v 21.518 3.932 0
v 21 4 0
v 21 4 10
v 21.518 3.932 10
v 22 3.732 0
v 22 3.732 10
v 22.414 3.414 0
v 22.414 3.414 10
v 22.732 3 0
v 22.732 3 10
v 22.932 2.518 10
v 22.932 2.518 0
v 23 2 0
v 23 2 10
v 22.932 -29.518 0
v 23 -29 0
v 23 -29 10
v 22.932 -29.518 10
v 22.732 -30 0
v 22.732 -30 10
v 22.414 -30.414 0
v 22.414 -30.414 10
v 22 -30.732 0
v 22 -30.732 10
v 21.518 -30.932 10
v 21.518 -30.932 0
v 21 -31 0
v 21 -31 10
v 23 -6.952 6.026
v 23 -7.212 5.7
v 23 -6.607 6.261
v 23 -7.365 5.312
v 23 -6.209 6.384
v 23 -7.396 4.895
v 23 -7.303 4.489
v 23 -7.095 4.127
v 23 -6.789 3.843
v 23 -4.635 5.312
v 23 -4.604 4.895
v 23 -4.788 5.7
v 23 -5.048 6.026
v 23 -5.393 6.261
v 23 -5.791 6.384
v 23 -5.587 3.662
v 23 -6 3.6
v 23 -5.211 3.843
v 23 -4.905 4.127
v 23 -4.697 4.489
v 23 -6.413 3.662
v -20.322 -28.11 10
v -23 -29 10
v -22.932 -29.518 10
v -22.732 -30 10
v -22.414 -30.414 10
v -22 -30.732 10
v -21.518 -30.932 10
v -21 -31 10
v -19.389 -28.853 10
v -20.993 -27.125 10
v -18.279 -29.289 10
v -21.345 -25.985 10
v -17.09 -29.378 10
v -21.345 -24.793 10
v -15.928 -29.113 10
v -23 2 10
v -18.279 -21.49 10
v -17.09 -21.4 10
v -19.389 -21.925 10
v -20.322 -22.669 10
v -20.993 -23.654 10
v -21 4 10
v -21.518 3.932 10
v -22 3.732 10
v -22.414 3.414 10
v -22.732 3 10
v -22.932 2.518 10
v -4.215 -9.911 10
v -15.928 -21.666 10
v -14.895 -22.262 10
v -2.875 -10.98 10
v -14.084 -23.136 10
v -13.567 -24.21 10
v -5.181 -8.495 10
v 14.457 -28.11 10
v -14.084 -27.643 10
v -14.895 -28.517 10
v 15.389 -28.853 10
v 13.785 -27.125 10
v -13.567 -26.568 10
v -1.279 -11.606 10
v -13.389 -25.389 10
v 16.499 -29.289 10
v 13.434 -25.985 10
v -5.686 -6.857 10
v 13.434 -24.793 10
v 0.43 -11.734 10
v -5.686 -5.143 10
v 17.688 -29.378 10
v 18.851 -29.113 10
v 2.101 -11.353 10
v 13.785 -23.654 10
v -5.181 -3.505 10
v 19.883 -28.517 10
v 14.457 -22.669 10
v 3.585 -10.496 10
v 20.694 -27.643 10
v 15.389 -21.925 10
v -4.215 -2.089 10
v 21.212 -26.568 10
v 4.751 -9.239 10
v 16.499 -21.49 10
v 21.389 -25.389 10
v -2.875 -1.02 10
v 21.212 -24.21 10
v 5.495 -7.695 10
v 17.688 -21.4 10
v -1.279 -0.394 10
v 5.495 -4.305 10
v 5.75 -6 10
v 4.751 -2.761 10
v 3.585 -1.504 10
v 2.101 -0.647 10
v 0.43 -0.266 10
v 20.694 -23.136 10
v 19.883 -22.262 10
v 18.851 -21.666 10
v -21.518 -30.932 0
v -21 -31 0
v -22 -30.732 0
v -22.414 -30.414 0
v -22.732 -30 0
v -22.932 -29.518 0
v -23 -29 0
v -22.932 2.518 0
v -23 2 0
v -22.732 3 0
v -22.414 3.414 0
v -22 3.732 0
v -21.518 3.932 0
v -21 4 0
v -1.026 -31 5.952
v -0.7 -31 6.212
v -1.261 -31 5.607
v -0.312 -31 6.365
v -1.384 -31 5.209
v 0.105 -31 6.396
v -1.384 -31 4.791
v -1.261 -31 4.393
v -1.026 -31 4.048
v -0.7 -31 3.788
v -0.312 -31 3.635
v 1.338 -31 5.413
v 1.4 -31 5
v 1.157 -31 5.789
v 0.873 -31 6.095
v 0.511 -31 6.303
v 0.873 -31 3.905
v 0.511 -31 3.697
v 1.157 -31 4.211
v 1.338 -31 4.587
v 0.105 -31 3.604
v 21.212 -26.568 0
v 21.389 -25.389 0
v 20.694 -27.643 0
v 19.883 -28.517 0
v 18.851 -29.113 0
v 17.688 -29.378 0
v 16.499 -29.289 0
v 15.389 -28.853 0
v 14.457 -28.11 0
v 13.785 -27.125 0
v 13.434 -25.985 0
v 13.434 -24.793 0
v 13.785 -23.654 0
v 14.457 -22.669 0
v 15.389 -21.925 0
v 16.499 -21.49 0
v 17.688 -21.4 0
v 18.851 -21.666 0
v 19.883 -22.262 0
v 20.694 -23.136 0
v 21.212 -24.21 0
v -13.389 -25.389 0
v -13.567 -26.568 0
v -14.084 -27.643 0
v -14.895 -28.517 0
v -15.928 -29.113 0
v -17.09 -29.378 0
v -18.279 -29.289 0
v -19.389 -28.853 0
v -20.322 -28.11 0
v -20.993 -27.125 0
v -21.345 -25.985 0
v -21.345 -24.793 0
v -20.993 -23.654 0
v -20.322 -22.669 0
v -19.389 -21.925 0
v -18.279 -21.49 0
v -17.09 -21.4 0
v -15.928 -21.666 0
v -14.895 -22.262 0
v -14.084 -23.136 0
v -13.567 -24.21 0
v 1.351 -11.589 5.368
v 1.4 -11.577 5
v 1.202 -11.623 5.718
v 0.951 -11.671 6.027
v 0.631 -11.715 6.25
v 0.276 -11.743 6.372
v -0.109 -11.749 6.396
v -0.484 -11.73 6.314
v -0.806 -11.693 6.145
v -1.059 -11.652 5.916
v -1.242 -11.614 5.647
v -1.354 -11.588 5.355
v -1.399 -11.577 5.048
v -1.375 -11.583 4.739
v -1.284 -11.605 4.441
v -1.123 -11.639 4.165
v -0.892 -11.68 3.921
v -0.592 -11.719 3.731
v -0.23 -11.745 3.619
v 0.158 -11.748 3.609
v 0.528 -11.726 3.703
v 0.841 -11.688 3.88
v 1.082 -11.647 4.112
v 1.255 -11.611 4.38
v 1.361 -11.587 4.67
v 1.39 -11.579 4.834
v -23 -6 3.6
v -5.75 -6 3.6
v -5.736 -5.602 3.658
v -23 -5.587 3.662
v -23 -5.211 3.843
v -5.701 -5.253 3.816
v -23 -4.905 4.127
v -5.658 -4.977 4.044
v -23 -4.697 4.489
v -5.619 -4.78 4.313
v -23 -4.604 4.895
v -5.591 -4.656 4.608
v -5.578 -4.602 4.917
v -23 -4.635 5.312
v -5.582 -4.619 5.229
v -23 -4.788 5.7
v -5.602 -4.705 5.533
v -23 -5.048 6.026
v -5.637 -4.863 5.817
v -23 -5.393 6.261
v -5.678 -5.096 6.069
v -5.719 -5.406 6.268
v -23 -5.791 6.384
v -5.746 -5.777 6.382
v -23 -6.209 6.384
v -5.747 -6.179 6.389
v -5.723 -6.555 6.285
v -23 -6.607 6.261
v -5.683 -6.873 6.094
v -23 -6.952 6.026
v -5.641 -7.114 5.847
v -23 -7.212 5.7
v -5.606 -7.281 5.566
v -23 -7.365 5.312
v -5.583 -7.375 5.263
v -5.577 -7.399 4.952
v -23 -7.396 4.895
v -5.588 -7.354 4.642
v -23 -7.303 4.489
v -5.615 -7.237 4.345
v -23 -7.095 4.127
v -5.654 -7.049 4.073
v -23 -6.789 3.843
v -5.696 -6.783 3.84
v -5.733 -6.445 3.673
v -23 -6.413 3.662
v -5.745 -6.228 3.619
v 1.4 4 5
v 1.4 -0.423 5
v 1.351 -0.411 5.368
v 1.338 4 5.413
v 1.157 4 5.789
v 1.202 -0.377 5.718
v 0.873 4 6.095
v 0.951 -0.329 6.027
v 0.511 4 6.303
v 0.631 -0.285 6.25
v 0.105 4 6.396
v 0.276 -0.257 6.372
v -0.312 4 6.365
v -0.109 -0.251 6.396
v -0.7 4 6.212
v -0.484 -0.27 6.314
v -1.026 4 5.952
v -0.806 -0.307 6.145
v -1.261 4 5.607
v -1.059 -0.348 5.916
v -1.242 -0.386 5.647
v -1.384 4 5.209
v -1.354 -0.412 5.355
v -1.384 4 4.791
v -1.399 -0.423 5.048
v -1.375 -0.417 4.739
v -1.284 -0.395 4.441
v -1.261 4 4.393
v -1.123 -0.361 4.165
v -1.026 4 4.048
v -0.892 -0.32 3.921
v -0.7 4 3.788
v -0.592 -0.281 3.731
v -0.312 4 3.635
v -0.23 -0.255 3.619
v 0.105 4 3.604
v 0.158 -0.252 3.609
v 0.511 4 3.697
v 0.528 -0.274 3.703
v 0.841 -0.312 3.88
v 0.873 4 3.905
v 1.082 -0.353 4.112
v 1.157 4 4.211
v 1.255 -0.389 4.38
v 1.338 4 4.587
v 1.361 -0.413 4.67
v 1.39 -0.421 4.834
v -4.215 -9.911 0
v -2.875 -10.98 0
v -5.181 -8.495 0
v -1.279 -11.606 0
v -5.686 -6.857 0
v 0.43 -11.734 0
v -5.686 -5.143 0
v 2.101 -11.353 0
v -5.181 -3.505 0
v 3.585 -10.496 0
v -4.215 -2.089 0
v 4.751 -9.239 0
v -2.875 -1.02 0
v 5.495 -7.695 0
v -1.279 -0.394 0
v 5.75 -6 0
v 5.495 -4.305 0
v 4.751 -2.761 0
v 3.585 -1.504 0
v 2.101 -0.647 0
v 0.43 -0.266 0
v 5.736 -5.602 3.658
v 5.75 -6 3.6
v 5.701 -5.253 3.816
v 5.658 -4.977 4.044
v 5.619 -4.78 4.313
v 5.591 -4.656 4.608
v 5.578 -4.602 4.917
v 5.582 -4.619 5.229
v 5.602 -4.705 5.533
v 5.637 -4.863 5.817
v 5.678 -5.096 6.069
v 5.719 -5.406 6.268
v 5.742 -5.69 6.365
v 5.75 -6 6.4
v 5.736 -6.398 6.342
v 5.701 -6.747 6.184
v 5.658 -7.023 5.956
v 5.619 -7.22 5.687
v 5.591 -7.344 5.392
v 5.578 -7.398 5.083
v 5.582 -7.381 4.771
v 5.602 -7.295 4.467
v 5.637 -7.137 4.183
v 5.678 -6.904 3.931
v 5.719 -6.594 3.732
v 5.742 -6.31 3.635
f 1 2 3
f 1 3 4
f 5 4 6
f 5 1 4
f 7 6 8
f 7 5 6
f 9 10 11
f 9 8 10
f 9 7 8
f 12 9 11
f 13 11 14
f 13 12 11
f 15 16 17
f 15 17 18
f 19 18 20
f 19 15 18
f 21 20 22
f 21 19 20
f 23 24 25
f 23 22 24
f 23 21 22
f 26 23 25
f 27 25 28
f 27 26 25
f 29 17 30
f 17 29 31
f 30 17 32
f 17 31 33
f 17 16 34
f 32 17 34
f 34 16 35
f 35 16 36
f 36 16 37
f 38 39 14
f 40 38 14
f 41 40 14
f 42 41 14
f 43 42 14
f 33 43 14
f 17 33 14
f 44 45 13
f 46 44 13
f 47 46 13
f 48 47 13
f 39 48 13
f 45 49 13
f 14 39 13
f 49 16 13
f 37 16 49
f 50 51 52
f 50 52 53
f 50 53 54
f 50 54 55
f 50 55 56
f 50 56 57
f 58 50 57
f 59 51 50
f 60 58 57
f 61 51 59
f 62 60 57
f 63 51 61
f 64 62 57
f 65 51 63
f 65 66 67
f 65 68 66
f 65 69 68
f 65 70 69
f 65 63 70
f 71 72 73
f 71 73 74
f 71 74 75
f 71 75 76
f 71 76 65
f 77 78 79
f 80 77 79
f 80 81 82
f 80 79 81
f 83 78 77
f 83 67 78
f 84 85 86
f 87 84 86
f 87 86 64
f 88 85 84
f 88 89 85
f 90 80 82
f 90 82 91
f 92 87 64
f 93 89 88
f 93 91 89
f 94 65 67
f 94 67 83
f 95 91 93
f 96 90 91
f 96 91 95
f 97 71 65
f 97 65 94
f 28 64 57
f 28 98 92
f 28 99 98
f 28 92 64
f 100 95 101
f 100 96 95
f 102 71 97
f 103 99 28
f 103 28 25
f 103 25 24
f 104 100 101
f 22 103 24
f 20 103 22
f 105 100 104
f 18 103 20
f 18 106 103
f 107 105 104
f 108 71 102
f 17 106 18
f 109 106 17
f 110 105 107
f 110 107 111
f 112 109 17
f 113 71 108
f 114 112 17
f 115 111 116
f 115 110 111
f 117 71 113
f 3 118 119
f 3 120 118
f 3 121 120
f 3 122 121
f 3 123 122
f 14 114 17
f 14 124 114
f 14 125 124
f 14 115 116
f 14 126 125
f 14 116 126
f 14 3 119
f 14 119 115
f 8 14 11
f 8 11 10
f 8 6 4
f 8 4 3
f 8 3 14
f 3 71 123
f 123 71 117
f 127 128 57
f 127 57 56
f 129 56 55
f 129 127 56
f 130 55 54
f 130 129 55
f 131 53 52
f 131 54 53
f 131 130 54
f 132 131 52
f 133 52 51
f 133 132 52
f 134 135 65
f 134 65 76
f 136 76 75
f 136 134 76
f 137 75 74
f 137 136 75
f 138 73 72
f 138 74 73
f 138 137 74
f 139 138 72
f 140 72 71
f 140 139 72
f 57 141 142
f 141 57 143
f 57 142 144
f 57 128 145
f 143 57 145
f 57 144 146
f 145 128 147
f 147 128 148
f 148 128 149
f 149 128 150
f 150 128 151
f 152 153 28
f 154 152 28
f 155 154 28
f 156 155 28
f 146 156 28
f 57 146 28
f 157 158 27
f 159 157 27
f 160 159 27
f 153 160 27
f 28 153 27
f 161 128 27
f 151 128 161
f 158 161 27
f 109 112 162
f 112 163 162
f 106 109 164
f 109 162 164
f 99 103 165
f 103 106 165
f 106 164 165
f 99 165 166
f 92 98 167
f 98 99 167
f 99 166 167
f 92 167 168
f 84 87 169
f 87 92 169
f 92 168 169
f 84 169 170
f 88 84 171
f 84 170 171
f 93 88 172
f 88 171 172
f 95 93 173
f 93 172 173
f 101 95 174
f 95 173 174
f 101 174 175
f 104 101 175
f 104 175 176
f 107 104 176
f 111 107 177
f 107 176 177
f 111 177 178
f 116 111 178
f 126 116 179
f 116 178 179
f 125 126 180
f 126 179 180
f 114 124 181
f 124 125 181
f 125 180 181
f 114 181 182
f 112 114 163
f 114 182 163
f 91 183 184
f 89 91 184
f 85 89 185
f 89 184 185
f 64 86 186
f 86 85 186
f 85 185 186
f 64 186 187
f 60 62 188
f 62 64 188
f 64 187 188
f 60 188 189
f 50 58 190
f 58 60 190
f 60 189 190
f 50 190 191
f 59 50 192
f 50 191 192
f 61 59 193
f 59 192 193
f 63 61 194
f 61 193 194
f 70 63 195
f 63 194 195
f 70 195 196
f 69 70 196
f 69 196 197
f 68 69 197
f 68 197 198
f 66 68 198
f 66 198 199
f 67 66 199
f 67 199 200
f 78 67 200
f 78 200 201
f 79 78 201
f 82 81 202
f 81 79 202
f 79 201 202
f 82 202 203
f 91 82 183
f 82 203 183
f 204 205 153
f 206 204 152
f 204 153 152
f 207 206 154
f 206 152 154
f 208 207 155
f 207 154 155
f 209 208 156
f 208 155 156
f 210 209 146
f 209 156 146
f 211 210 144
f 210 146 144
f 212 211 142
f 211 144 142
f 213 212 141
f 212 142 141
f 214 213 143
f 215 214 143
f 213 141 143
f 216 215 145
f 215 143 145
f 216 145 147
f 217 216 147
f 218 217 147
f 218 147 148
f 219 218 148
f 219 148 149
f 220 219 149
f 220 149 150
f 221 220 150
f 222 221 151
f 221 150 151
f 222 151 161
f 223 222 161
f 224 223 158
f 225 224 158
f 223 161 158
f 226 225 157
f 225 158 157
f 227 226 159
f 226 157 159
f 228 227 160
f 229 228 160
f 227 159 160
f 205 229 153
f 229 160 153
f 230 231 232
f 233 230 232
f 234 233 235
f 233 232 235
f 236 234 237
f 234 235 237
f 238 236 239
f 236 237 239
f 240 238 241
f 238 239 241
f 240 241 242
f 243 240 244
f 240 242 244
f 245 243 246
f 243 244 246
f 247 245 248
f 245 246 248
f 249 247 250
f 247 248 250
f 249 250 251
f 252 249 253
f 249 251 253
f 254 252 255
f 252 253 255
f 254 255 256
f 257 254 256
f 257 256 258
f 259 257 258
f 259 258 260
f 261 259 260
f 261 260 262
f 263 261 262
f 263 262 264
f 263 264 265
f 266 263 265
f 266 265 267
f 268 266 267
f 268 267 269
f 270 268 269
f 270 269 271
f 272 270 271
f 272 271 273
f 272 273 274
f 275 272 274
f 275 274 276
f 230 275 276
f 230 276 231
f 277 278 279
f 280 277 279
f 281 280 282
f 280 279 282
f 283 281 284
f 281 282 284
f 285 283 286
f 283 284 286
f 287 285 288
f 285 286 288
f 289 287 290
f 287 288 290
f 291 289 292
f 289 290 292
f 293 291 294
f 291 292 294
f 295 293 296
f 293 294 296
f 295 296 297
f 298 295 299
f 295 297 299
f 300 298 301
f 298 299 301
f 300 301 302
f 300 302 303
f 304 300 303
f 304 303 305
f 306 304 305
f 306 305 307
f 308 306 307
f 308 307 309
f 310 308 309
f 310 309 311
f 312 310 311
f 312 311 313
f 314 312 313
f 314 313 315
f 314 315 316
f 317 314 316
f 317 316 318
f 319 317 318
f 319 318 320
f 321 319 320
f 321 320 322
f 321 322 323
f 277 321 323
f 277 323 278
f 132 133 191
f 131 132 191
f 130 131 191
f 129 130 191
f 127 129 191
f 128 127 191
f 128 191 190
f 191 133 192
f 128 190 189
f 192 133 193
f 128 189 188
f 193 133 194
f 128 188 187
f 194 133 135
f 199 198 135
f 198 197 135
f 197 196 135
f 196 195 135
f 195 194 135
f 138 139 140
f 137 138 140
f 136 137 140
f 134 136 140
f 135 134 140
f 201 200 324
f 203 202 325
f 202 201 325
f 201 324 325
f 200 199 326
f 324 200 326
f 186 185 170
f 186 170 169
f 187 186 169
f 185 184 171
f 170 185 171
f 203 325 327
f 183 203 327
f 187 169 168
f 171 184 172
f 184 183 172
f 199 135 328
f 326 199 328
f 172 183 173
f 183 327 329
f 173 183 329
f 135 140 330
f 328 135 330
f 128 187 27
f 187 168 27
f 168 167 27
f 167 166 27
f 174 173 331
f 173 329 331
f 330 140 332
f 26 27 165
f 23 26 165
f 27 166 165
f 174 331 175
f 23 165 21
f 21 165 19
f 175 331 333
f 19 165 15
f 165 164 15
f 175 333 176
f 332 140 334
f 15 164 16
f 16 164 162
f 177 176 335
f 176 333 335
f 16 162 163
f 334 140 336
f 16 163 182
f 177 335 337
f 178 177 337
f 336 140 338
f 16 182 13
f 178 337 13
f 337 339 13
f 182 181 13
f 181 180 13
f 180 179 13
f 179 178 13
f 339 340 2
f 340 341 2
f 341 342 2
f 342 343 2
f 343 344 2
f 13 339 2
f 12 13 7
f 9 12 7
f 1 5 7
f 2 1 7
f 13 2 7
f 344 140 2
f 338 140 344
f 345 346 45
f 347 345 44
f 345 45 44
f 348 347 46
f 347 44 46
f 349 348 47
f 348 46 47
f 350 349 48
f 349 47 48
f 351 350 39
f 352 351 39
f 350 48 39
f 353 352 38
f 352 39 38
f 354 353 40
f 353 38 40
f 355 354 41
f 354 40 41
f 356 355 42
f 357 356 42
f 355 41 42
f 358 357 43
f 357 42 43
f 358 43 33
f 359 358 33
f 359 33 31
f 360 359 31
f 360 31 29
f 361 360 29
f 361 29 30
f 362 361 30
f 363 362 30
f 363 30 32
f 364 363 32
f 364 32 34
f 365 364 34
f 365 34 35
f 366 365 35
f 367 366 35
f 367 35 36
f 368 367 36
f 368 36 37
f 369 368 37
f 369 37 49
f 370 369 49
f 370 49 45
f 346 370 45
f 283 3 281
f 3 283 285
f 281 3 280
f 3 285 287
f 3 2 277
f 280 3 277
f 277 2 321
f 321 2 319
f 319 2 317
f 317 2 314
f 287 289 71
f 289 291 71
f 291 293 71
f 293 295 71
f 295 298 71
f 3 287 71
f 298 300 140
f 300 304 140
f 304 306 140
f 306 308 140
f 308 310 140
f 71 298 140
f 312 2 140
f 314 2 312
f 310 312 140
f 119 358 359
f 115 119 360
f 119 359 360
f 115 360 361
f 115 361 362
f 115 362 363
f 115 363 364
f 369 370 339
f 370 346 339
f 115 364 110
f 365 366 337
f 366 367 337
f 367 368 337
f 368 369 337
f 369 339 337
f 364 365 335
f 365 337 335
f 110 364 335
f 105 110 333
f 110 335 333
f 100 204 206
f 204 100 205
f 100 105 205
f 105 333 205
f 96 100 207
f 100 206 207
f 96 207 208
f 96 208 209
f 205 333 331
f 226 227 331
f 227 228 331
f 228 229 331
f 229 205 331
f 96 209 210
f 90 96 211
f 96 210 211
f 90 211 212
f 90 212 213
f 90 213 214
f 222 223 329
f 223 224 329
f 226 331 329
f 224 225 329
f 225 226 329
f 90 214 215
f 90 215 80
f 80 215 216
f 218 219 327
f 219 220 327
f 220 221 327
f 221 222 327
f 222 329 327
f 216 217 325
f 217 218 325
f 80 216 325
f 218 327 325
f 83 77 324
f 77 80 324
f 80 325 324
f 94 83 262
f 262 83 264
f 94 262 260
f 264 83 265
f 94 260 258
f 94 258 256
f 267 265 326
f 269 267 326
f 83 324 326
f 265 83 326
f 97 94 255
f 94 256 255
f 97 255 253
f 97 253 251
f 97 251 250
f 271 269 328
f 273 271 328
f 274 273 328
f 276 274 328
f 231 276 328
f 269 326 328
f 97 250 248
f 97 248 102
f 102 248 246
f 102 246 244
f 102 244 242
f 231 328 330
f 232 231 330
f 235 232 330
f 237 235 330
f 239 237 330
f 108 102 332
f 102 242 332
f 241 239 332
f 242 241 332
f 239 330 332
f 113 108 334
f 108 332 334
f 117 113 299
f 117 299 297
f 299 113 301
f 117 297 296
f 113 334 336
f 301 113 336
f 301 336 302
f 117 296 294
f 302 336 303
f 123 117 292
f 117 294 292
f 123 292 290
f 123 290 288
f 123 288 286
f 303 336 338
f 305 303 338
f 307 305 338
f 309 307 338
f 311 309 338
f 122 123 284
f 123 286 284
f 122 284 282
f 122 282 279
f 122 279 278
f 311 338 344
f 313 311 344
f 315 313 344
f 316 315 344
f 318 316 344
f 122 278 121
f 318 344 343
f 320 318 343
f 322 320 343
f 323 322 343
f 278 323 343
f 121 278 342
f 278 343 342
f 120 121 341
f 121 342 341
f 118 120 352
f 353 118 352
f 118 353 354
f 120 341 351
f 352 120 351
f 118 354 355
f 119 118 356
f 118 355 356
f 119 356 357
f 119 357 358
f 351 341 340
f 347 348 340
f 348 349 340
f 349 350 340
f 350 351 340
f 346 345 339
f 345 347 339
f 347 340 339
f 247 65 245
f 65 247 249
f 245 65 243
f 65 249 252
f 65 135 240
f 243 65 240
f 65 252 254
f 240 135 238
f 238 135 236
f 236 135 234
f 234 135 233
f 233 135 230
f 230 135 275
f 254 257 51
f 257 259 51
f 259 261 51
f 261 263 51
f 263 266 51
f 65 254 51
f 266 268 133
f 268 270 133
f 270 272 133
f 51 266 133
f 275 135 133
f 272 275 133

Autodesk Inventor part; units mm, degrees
ref_plane "YZ Plane" through (0, 0, 0) normal (1, 0, 0) x (0, 1, 0)
ref_plane "XZ Plane" through (0, 0, 0) normal (0, 1, 0) x (-1, 0, 0)
ref_plane "XY Plane" through (0, 0, 0) normal (0, 0, 1) x (1, 0, 0)
ref_plane "Arbeitsebene1" through (0, 0, 0) normal (0, 0, 1) x (1, 0, 0)
sketch "Skizze1" plane through (0, 0, 0) normal (0, 0, 1) x (1, 0, 0)
  circle A0 centre (17.3893, 23.3893) radius 1.4 projected
  circle A1 centre (-17.3893, -25.3893) radius 1.4 projected
  circle A2 centre (17.3893, -25.3893) radius 1.4 projected
  circle A3 centre (-17.3893, 23.3893) radius 1.4 projected
  arc A4 (21, -31) -> (23, -29) centre (21, -29) ccw projected
  line L0 (23, -29) -> (23, 29) projected
  line L1 (11.5, 29) -> (23, 29) projected
  line L2 (11.5, 29) -> (11.5, -19) projected
  line L3 (11.5, -19) -> (-11.5, -19) projected
  line L4 (-11.5, -19) -> (-11.5, 29) projected
  line L5 (-23, 29) -> (-11.5, 29) projected
  line L6 (-23, 29) -> (-23, -29) projected
  arc A5 (-23, -29) -> (-21, -31) centre (-21, -29) ccw projected
  line L7 (-21, -31) -> (21, -31) projected
  circle A6 centre (-17.3893, -25.3893) radius 4
  circle A7 centre (17.3893, -25.3893) radius 4
  line L8 (-21, -31) -> (21, -31)
  line L9 (23, -29) -> (23, 2)
  line L10 (21, 4) -> (-21, 4)
  line L11 (-23, 2) -> (-23, -29)
  circle A8 centre (0, -6) radius 5.75
  arc A9 (-21, 4) -> (-23, 2) centre (-21, 2) ccw
  arc A10 (23, 2) -> (21, 4) centre (21, 2) ccw
  arc A11 (21, -31) -> (23, -29) centre (21, -29) ccw
  arc A12 (-23, -29) -> (-21, -31) centre (-21, -29) ccw
  point P0 (0, 0)
  point P1 (23, 4)
  dimension "d0" = 8
  dimension "d1" = 8
  dimension "d2" = 11.5
  dimension "d3" = 25
  dimension "d4" = 35
  dimension "d5" = 0
  dimension "d6" = 2
extrude "Extrusion1" add sketch "Skizze1" along normal blind 10 contours L7 A5 L6 A9 L10 L4 L3 L2 A10 L0 A4 | L2 L3 L4 L10
sketch "Skizze2" plane through (23, -29, 0) normal (1, 0, 0) x (0, 0, -1)
  line L0 (-10, 17.25) -> (0, 17.25) projected
  line L1 (-10, 28.75) -> (0, 28.75) projected
  line L2 (-10, 0) -> (-10, 31) projected
  line L3 (0, 0) -> (0, 31) projected
  circle A0 centre (-5, 23) radius 1.4
  point P0 (0, 29)
  dimension "d9" = 2.8
  dimension "d10" = 5.75
extrude "Extrusion2" cut sketch "Skizze2" against normal through all contours A0
sketch "Skizze3" plane through (-21, -31, 0) normal (0, -1, 0) x (1, 0, 0)
  line L0 (15.25, 10) -> (15.25, 0) projected
  line L1 (26.75, 10) -> (26.75, 0) projected
  circle A0 centre (21, 5) radius 1.4
  point P0 (21, 0)
  dimension "d13" = 2.8
extrude "Extrusion3" cut sketch "Skizze3" against normal through all
properties part number "Anglerfish_coverslipclamp_lampclamp"
